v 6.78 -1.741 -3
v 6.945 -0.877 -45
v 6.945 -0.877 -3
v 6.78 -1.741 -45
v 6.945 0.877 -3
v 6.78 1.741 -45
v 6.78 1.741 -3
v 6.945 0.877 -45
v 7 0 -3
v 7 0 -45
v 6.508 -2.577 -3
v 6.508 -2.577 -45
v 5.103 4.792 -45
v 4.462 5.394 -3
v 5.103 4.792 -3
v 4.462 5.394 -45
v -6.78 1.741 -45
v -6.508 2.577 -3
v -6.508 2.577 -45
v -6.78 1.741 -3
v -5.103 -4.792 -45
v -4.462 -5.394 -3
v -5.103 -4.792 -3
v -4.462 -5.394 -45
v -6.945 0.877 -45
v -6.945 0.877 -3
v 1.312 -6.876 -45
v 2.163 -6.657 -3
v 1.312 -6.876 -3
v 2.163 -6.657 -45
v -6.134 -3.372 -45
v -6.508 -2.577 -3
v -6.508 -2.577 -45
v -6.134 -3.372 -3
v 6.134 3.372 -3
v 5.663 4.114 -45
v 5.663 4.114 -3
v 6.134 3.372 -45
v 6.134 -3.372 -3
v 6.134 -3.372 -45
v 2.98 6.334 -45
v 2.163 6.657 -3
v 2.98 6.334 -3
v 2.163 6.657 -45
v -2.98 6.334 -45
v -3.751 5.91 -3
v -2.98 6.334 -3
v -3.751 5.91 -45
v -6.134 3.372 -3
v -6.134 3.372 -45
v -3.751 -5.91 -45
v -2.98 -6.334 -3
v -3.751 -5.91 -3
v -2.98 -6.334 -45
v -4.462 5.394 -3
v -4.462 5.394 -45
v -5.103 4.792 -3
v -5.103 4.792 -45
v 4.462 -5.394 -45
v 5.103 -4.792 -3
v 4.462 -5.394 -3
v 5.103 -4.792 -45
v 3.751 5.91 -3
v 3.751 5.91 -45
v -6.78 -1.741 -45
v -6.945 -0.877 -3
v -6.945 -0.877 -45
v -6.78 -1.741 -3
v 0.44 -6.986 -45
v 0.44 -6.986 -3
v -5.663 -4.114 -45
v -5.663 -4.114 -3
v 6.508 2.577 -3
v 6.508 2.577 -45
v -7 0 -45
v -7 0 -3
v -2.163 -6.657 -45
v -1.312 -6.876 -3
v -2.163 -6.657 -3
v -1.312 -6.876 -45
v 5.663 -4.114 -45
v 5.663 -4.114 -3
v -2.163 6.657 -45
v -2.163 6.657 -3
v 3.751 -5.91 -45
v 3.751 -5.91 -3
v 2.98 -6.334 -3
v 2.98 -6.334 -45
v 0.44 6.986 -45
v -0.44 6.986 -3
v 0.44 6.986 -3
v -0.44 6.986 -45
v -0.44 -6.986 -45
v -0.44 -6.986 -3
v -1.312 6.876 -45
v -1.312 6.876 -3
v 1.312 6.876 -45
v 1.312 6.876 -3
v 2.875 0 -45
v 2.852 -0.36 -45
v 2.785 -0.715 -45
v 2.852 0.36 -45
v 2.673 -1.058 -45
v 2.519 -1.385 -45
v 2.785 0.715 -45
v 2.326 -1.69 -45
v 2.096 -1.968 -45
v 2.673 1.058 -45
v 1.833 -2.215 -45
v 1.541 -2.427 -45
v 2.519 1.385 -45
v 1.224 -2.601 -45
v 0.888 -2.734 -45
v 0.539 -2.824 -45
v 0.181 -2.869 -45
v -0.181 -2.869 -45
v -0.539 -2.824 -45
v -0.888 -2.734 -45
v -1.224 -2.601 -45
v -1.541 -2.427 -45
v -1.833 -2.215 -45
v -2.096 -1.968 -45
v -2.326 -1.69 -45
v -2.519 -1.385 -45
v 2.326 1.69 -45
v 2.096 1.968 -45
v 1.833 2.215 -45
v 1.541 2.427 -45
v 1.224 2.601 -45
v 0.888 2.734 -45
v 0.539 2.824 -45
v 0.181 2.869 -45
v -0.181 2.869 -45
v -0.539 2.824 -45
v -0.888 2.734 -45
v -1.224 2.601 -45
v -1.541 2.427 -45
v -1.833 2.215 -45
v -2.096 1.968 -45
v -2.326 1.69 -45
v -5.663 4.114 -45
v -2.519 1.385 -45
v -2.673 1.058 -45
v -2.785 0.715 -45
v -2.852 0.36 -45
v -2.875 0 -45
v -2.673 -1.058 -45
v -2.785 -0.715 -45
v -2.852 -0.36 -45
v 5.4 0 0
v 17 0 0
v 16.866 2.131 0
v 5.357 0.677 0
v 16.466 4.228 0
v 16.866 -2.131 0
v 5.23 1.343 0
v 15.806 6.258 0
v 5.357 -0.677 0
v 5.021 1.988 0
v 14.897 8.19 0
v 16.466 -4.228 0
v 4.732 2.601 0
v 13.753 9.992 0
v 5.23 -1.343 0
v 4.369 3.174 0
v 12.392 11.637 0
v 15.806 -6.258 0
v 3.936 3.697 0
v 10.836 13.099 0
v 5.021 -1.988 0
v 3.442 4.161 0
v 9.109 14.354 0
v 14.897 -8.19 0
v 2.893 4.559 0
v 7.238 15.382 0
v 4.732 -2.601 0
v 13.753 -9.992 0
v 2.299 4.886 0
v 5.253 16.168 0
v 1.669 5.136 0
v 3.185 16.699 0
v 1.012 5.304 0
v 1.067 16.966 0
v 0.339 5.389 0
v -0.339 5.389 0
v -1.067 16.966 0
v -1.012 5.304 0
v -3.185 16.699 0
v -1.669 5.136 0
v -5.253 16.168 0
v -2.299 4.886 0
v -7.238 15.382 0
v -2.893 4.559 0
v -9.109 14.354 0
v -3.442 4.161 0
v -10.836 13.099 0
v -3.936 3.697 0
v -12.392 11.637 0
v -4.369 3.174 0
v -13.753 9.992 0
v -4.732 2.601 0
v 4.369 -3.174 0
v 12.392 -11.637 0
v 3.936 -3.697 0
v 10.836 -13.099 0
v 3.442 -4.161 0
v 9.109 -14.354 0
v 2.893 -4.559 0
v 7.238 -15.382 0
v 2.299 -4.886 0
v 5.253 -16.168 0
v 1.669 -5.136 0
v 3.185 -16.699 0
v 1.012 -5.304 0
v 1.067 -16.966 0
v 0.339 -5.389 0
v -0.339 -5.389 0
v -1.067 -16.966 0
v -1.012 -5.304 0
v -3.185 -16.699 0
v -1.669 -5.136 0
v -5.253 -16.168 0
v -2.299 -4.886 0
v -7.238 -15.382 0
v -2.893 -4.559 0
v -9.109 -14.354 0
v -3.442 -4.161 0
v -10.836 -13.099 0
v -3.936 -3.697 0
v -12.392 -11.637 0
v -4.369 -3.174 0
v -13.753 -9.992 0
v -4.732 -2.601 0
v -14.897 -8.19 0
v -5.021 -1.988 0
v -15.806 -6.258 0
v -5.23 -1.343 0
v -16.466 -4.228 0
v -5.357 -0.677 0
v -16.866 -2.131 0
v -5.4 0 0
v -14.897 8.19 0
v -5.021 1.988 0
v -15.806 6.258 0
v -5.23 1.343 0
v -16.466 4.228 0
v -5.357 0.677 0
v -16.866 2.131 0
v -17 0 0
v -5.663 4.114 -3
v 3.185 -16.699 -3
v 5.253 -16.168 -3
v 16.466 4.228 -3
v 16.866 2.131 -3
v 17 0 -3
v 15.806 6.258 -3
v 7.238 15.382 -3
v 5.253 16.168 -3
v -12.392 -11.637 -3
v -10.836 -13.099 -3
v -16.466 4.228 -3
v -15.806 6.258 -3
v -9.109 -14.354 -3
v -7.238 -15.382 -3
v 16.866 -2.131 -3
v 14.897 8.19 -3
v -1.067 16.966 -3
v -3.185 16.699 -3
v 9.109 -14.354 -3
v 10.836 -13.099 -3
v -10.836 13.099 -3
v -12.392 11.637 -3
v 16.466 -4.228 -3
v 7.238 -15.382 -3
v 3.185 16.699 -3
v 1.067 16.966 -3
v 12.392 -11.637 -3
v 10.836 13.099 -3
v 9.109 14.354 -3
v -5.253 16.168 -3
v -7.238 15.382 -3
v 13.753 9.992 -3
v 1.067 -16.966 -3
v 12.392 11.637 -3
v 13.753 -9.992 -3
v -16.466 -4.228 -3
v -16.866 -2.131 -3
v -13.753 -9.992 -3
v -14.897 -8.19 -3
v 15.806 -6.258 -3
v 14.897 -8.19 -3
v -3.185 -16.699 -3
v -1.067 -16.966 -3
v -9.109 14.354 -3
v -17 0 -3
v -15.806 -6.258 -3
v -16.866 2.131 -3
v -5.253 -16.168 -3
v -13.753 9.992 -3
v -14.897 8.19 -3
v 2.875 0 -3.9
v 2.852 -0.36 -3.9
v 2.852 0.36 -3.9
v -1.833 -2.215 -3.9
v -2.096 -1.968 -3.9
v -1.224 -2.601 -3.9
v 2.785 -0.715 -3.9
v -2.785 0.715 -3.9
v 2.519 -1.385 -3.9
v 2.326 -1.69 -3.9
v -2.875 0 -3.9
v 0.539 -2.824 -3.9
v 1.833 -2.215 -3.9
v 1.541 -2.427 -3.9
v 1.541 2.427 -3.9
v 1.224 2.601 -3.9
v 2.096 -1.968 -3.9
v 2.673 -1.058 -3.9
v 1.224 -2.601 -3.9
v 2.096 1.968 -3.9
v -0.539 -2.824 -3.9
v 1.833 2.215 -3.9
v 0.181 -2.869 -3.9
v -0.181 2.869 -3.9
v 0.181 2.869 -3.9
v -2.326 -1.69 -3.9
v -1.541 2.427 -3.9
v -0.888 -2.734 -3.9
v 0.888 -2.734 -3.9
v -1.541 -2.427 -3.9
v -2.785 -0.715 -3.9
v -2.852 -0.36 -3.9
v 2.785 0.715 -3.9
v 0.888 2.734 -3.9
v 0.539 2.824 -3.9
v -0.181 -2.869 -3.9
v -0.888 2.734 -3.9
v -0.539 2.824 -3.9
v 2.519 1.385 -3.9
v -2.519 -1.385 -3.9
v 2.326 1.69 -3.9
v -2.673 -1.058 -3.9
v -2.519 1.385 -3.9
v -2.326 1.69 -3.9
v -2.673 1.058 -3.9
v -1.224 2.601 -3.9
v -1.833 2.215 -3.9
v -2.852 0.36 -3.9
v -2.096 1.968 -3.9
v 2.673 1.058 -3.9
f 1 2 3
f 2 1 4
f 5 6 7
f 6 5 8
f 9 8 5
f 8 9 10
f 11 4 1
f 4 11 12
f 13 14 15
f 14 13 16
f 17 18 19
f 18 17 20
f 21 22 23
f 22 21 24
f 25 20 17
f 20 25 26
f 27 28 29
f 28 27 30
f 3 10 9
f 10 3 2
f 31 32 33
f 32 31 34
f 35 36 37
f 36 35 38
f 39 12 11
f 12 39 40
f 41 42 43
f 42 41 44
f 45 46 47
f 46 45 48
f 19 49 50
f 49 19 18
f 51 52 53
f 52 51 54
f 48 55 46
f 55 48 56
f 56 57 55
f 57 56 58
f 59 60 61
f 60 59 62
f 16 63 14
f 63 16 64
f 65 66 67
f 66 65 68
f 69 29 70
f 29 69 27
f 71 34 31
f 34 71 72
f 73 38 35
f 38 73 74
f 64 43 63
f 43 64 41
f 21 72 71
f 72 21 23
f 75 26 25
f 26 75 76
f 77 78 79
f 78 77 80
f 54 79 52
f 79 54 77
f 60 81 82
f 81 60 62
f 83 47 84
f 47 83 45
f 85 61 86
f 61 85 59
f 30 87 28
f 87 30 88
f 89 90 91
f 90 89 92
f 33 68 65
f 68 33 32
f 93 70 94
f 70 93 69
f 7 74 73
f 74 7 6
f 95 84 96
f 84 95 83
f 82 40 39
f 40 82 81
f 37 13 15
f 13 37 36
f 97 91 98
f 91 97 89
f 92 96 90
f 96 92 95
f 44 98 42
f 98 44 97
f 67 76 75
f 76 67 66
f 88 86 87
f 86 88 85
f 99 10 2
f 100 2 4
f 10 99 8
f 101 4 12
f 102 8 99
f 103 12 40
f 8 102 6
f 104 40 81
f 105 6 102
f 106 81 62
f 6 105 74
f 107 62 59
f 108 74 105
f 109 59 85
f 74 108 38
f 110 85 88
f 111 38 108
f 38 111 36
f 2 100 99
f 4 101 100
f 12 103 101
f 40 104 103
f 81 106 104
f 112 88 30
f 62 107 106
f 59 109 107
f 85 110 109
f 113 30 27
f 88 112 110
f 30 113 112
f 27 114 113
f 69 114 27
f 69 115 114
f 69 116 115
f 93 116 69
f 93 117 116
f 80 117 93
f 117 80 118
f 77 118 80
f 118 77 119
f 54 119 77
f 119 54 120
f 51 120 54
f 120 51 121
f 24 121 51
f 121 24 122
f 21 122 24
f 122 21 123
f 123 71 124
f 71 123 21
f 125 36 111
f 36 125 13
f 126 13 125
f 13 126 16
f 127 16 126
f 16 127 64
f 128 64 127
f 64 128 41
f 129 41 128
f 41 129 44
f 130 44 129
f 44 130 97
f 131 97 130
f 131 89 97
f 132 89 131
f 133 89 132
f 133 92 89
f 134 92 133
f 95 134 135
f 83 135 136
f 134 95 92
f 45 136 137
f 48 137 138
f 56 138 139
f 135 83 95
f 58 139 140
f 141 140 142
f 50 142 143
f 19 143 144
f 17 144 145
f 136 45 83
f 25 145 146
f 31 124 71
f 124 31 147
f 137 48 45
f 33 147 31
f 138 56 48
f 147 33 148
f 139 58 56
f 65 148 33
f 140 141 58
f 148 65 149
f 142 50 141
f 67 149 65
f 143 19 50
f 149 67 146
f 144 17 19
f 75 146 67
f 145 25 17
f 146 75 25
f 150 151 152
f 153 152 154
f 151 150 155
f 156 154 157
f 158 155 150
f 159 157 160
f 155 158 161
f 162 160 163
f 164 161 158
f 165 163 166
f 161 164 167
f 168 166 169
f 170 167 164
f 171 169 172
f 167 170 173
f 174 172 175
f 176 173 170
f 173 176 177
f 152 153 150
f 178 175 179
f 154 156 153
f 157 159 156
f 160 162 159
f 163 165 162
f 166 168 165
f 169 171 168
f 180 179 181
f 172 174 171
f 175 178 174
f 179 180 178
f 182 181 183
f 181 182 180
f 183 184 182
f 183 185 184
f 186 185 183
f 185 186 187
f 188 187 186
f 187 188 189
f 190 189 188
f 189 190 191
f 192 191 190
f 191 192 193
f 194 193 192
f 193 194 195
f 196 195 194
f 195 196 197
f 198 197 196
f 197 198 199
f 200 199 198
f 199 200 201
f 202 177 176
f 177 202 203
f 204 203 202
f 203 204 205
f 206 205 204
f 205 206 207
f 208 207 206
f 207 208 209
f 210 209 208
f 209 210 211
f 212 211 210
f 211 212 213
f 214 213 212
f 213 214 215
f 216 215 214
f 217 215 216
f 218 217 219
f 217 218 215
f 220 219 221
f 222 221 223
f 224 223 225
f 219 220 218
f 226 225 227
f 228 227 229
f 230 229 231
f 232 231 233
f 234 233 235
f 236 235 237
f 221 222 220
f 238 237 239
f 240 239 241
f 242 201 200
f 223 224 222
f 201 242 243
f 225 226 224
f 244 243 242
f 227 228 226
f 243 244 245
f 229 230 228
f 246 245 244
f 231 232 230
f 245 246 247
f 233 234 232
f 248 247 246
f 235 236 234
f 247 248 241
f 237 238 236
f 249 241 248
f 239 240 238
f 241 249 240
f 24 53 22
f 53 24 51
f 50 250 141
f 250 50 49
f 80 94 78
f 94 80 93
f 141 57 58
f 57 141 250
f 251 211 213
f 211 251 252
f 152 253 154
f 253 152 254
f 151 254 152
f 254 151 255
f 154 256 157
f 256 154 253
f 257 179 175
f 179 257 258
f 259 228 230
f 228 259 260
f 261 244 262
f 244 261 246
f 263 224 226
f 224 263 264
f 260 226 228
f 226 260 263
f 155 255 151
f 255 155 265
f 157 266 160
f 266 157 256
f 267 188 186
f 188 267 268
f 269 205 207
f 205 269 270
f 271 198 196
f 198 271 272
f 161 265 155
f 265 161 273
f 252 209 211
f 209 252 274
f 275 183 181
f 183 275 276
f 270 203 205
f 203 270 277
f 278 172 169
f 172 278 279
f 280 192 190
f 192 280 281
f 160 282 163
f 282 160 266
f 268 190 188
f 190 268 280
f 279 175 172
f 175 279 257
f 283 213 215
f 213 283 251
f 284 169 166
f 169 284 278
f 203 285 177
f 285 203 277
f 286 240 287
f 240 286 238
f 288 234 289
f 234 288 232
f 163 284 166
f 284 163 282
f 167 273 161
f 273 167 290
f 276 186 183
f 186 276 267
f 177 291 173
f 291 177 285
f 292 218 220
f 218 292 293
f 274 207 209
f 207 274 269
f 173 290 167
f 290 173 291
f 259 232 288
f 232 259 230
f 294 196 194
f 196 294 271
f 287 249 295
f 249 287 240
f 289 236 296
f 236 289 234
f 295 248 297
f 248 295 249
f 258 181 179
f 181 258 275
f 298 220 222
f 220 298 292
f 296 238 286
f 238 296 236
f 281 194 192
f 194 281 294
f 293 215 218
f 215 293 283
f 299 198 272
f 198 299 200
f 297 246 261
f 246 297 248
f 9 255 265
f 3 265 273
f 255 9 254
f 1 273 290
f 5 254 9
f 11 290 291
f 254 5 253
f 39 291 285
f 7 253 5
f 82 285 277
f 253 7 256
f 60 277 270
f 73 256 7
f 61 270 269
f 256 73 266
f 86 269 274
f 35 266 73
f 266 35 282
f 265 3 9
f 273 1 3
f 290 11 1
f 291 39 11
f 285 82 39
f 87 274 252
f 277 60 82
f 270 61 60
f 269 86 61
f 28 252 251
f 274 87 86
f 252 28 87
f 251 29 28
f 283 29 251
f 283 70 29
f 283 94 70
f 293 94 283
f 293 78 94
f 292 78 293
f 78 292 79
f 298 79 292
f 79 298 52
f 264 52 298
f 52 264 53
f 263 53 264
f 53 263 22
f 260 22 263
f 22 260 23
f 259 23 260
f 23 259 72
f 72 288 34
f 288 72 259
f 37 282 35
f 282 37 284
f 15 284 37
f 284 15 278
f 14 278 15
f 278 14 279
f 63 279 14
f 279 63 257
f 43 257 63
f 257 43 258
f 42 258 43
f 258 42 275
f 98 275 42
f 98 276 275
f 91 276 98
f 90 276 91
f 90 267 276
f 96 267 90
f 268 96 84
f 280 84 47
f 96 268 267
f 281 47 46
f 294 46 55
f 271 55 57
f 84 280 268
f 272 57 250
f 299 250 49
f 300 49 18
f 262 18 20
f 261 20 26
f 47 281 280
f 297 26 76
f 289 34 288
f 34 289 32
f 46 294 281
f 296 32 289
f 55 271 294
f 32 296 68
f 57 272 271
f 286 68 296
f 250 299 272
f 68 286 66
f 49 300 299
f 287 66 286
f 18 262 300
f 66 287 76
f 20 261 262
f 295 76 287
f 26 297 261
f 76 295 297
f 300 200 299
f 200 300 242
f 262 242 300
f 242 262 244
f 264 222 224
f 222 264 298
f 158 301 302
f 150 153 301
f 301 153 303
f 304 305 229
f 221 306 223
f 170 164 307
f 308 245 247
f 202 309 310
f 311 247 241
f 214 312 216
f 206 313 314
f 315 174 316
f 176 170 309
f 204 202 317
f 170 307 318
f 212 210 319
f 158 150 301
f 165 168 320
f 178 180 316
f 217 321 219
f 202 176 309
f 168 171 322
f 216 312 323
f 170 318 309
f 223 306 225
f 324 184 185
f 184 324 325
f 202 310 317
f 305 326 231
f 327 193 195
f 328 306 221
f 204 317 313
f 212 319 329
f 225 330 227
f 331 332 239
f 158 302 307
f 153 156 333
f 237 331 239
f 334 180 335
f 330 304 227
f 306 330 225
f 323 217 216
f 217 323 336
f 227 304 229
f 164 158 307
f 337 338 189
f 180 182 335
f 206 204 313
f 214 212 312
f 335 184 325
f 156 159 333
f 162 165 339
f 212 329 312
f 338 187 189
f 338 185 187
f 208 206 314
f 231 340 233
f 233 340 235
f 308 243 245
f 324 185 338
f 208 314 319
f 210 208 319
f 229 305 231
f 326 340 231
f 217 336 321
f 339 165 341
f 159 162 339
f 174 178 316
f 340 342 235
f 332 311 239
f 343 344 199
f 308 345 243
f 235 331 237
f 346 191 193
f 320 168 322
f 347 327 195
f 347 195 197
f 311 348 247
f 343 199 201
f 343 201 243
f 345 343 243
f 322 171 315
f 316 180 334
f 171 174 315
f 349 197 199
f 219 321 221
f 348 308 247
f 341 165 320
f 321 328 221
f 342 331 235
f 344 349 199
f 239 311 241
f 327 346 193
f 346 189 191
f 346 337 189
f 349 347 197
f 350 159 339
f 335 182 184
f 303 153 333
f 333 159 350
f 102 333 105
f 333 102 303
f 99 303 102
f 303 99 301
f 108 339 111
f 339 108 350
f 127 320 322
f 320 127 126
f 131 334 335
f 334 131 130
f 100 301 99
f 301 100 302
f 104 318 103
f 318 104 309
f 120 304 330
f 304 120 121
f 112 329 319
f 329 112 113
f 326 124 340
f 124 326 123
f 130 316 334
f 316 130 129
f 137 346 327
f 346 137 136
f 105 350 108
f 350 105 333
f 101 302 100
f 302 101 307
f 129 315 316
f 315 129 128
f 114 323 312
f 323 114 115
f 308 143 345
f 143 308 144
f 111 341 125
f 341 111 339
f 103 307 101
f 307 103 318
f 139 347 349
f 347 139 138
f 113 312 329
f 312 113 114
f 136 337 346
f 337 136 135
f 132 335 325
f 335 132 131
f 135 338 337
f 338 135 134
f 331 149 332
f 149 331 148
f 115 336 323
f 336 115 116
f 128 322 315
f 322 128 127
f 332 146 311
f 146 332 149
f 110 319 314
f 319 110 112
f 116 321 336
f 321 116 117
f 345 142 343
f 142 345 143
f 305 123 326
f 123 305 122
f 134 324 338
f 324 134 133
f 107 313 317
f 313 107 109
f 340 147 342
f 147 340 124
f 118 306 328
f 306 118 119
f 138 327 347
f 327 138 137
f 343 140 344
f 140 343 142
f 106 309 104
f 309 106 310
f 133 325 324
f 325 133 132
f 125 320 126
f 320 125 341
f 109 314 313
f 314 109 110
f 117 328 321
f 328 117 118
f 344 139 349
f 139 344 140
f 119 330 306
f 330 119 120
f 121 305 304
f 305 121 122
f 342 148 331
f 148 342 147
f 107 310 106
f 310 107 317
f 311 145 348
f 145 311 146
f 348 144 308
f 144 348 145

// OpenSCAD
$fn = 50;


difference() {
	union() {
		translate(v = [0, 0, -45.0000000000]) {
			cylinder(h = 45, r = 7.0000000000);
		}
		translate(v = [0, 0, -3.0000000000]) {
			cylinder(h = 3, r = 17.0000000000);
		}
	}
	union() {
		translate(v = [0, 0, 0]) {
			rotate(a = [0, 0, 0]) {
				difference() {
					union() {
						#translate(v = [0, 0, -45.0000000000]) {
							cylinder(h = 45, r = 2.6000000000);
						}
						#translate(v = [0, 0, -3.9000000000]) {
							cylinder(h = 3.9000000000, r1 = 2.8750000000, r2 = 5.4000000000);
						}
						#translate(v = [0, 0, -45.0000000000]) {
							cylinder(h = 45, r = 2.8750000000);
						}
						#translate(v = [0, 0, -45.0000000000]) {
							cylinder(h = 45, r = 2.6000000000);
						}
					}
					union();
				}
			}
		}
	}
}
